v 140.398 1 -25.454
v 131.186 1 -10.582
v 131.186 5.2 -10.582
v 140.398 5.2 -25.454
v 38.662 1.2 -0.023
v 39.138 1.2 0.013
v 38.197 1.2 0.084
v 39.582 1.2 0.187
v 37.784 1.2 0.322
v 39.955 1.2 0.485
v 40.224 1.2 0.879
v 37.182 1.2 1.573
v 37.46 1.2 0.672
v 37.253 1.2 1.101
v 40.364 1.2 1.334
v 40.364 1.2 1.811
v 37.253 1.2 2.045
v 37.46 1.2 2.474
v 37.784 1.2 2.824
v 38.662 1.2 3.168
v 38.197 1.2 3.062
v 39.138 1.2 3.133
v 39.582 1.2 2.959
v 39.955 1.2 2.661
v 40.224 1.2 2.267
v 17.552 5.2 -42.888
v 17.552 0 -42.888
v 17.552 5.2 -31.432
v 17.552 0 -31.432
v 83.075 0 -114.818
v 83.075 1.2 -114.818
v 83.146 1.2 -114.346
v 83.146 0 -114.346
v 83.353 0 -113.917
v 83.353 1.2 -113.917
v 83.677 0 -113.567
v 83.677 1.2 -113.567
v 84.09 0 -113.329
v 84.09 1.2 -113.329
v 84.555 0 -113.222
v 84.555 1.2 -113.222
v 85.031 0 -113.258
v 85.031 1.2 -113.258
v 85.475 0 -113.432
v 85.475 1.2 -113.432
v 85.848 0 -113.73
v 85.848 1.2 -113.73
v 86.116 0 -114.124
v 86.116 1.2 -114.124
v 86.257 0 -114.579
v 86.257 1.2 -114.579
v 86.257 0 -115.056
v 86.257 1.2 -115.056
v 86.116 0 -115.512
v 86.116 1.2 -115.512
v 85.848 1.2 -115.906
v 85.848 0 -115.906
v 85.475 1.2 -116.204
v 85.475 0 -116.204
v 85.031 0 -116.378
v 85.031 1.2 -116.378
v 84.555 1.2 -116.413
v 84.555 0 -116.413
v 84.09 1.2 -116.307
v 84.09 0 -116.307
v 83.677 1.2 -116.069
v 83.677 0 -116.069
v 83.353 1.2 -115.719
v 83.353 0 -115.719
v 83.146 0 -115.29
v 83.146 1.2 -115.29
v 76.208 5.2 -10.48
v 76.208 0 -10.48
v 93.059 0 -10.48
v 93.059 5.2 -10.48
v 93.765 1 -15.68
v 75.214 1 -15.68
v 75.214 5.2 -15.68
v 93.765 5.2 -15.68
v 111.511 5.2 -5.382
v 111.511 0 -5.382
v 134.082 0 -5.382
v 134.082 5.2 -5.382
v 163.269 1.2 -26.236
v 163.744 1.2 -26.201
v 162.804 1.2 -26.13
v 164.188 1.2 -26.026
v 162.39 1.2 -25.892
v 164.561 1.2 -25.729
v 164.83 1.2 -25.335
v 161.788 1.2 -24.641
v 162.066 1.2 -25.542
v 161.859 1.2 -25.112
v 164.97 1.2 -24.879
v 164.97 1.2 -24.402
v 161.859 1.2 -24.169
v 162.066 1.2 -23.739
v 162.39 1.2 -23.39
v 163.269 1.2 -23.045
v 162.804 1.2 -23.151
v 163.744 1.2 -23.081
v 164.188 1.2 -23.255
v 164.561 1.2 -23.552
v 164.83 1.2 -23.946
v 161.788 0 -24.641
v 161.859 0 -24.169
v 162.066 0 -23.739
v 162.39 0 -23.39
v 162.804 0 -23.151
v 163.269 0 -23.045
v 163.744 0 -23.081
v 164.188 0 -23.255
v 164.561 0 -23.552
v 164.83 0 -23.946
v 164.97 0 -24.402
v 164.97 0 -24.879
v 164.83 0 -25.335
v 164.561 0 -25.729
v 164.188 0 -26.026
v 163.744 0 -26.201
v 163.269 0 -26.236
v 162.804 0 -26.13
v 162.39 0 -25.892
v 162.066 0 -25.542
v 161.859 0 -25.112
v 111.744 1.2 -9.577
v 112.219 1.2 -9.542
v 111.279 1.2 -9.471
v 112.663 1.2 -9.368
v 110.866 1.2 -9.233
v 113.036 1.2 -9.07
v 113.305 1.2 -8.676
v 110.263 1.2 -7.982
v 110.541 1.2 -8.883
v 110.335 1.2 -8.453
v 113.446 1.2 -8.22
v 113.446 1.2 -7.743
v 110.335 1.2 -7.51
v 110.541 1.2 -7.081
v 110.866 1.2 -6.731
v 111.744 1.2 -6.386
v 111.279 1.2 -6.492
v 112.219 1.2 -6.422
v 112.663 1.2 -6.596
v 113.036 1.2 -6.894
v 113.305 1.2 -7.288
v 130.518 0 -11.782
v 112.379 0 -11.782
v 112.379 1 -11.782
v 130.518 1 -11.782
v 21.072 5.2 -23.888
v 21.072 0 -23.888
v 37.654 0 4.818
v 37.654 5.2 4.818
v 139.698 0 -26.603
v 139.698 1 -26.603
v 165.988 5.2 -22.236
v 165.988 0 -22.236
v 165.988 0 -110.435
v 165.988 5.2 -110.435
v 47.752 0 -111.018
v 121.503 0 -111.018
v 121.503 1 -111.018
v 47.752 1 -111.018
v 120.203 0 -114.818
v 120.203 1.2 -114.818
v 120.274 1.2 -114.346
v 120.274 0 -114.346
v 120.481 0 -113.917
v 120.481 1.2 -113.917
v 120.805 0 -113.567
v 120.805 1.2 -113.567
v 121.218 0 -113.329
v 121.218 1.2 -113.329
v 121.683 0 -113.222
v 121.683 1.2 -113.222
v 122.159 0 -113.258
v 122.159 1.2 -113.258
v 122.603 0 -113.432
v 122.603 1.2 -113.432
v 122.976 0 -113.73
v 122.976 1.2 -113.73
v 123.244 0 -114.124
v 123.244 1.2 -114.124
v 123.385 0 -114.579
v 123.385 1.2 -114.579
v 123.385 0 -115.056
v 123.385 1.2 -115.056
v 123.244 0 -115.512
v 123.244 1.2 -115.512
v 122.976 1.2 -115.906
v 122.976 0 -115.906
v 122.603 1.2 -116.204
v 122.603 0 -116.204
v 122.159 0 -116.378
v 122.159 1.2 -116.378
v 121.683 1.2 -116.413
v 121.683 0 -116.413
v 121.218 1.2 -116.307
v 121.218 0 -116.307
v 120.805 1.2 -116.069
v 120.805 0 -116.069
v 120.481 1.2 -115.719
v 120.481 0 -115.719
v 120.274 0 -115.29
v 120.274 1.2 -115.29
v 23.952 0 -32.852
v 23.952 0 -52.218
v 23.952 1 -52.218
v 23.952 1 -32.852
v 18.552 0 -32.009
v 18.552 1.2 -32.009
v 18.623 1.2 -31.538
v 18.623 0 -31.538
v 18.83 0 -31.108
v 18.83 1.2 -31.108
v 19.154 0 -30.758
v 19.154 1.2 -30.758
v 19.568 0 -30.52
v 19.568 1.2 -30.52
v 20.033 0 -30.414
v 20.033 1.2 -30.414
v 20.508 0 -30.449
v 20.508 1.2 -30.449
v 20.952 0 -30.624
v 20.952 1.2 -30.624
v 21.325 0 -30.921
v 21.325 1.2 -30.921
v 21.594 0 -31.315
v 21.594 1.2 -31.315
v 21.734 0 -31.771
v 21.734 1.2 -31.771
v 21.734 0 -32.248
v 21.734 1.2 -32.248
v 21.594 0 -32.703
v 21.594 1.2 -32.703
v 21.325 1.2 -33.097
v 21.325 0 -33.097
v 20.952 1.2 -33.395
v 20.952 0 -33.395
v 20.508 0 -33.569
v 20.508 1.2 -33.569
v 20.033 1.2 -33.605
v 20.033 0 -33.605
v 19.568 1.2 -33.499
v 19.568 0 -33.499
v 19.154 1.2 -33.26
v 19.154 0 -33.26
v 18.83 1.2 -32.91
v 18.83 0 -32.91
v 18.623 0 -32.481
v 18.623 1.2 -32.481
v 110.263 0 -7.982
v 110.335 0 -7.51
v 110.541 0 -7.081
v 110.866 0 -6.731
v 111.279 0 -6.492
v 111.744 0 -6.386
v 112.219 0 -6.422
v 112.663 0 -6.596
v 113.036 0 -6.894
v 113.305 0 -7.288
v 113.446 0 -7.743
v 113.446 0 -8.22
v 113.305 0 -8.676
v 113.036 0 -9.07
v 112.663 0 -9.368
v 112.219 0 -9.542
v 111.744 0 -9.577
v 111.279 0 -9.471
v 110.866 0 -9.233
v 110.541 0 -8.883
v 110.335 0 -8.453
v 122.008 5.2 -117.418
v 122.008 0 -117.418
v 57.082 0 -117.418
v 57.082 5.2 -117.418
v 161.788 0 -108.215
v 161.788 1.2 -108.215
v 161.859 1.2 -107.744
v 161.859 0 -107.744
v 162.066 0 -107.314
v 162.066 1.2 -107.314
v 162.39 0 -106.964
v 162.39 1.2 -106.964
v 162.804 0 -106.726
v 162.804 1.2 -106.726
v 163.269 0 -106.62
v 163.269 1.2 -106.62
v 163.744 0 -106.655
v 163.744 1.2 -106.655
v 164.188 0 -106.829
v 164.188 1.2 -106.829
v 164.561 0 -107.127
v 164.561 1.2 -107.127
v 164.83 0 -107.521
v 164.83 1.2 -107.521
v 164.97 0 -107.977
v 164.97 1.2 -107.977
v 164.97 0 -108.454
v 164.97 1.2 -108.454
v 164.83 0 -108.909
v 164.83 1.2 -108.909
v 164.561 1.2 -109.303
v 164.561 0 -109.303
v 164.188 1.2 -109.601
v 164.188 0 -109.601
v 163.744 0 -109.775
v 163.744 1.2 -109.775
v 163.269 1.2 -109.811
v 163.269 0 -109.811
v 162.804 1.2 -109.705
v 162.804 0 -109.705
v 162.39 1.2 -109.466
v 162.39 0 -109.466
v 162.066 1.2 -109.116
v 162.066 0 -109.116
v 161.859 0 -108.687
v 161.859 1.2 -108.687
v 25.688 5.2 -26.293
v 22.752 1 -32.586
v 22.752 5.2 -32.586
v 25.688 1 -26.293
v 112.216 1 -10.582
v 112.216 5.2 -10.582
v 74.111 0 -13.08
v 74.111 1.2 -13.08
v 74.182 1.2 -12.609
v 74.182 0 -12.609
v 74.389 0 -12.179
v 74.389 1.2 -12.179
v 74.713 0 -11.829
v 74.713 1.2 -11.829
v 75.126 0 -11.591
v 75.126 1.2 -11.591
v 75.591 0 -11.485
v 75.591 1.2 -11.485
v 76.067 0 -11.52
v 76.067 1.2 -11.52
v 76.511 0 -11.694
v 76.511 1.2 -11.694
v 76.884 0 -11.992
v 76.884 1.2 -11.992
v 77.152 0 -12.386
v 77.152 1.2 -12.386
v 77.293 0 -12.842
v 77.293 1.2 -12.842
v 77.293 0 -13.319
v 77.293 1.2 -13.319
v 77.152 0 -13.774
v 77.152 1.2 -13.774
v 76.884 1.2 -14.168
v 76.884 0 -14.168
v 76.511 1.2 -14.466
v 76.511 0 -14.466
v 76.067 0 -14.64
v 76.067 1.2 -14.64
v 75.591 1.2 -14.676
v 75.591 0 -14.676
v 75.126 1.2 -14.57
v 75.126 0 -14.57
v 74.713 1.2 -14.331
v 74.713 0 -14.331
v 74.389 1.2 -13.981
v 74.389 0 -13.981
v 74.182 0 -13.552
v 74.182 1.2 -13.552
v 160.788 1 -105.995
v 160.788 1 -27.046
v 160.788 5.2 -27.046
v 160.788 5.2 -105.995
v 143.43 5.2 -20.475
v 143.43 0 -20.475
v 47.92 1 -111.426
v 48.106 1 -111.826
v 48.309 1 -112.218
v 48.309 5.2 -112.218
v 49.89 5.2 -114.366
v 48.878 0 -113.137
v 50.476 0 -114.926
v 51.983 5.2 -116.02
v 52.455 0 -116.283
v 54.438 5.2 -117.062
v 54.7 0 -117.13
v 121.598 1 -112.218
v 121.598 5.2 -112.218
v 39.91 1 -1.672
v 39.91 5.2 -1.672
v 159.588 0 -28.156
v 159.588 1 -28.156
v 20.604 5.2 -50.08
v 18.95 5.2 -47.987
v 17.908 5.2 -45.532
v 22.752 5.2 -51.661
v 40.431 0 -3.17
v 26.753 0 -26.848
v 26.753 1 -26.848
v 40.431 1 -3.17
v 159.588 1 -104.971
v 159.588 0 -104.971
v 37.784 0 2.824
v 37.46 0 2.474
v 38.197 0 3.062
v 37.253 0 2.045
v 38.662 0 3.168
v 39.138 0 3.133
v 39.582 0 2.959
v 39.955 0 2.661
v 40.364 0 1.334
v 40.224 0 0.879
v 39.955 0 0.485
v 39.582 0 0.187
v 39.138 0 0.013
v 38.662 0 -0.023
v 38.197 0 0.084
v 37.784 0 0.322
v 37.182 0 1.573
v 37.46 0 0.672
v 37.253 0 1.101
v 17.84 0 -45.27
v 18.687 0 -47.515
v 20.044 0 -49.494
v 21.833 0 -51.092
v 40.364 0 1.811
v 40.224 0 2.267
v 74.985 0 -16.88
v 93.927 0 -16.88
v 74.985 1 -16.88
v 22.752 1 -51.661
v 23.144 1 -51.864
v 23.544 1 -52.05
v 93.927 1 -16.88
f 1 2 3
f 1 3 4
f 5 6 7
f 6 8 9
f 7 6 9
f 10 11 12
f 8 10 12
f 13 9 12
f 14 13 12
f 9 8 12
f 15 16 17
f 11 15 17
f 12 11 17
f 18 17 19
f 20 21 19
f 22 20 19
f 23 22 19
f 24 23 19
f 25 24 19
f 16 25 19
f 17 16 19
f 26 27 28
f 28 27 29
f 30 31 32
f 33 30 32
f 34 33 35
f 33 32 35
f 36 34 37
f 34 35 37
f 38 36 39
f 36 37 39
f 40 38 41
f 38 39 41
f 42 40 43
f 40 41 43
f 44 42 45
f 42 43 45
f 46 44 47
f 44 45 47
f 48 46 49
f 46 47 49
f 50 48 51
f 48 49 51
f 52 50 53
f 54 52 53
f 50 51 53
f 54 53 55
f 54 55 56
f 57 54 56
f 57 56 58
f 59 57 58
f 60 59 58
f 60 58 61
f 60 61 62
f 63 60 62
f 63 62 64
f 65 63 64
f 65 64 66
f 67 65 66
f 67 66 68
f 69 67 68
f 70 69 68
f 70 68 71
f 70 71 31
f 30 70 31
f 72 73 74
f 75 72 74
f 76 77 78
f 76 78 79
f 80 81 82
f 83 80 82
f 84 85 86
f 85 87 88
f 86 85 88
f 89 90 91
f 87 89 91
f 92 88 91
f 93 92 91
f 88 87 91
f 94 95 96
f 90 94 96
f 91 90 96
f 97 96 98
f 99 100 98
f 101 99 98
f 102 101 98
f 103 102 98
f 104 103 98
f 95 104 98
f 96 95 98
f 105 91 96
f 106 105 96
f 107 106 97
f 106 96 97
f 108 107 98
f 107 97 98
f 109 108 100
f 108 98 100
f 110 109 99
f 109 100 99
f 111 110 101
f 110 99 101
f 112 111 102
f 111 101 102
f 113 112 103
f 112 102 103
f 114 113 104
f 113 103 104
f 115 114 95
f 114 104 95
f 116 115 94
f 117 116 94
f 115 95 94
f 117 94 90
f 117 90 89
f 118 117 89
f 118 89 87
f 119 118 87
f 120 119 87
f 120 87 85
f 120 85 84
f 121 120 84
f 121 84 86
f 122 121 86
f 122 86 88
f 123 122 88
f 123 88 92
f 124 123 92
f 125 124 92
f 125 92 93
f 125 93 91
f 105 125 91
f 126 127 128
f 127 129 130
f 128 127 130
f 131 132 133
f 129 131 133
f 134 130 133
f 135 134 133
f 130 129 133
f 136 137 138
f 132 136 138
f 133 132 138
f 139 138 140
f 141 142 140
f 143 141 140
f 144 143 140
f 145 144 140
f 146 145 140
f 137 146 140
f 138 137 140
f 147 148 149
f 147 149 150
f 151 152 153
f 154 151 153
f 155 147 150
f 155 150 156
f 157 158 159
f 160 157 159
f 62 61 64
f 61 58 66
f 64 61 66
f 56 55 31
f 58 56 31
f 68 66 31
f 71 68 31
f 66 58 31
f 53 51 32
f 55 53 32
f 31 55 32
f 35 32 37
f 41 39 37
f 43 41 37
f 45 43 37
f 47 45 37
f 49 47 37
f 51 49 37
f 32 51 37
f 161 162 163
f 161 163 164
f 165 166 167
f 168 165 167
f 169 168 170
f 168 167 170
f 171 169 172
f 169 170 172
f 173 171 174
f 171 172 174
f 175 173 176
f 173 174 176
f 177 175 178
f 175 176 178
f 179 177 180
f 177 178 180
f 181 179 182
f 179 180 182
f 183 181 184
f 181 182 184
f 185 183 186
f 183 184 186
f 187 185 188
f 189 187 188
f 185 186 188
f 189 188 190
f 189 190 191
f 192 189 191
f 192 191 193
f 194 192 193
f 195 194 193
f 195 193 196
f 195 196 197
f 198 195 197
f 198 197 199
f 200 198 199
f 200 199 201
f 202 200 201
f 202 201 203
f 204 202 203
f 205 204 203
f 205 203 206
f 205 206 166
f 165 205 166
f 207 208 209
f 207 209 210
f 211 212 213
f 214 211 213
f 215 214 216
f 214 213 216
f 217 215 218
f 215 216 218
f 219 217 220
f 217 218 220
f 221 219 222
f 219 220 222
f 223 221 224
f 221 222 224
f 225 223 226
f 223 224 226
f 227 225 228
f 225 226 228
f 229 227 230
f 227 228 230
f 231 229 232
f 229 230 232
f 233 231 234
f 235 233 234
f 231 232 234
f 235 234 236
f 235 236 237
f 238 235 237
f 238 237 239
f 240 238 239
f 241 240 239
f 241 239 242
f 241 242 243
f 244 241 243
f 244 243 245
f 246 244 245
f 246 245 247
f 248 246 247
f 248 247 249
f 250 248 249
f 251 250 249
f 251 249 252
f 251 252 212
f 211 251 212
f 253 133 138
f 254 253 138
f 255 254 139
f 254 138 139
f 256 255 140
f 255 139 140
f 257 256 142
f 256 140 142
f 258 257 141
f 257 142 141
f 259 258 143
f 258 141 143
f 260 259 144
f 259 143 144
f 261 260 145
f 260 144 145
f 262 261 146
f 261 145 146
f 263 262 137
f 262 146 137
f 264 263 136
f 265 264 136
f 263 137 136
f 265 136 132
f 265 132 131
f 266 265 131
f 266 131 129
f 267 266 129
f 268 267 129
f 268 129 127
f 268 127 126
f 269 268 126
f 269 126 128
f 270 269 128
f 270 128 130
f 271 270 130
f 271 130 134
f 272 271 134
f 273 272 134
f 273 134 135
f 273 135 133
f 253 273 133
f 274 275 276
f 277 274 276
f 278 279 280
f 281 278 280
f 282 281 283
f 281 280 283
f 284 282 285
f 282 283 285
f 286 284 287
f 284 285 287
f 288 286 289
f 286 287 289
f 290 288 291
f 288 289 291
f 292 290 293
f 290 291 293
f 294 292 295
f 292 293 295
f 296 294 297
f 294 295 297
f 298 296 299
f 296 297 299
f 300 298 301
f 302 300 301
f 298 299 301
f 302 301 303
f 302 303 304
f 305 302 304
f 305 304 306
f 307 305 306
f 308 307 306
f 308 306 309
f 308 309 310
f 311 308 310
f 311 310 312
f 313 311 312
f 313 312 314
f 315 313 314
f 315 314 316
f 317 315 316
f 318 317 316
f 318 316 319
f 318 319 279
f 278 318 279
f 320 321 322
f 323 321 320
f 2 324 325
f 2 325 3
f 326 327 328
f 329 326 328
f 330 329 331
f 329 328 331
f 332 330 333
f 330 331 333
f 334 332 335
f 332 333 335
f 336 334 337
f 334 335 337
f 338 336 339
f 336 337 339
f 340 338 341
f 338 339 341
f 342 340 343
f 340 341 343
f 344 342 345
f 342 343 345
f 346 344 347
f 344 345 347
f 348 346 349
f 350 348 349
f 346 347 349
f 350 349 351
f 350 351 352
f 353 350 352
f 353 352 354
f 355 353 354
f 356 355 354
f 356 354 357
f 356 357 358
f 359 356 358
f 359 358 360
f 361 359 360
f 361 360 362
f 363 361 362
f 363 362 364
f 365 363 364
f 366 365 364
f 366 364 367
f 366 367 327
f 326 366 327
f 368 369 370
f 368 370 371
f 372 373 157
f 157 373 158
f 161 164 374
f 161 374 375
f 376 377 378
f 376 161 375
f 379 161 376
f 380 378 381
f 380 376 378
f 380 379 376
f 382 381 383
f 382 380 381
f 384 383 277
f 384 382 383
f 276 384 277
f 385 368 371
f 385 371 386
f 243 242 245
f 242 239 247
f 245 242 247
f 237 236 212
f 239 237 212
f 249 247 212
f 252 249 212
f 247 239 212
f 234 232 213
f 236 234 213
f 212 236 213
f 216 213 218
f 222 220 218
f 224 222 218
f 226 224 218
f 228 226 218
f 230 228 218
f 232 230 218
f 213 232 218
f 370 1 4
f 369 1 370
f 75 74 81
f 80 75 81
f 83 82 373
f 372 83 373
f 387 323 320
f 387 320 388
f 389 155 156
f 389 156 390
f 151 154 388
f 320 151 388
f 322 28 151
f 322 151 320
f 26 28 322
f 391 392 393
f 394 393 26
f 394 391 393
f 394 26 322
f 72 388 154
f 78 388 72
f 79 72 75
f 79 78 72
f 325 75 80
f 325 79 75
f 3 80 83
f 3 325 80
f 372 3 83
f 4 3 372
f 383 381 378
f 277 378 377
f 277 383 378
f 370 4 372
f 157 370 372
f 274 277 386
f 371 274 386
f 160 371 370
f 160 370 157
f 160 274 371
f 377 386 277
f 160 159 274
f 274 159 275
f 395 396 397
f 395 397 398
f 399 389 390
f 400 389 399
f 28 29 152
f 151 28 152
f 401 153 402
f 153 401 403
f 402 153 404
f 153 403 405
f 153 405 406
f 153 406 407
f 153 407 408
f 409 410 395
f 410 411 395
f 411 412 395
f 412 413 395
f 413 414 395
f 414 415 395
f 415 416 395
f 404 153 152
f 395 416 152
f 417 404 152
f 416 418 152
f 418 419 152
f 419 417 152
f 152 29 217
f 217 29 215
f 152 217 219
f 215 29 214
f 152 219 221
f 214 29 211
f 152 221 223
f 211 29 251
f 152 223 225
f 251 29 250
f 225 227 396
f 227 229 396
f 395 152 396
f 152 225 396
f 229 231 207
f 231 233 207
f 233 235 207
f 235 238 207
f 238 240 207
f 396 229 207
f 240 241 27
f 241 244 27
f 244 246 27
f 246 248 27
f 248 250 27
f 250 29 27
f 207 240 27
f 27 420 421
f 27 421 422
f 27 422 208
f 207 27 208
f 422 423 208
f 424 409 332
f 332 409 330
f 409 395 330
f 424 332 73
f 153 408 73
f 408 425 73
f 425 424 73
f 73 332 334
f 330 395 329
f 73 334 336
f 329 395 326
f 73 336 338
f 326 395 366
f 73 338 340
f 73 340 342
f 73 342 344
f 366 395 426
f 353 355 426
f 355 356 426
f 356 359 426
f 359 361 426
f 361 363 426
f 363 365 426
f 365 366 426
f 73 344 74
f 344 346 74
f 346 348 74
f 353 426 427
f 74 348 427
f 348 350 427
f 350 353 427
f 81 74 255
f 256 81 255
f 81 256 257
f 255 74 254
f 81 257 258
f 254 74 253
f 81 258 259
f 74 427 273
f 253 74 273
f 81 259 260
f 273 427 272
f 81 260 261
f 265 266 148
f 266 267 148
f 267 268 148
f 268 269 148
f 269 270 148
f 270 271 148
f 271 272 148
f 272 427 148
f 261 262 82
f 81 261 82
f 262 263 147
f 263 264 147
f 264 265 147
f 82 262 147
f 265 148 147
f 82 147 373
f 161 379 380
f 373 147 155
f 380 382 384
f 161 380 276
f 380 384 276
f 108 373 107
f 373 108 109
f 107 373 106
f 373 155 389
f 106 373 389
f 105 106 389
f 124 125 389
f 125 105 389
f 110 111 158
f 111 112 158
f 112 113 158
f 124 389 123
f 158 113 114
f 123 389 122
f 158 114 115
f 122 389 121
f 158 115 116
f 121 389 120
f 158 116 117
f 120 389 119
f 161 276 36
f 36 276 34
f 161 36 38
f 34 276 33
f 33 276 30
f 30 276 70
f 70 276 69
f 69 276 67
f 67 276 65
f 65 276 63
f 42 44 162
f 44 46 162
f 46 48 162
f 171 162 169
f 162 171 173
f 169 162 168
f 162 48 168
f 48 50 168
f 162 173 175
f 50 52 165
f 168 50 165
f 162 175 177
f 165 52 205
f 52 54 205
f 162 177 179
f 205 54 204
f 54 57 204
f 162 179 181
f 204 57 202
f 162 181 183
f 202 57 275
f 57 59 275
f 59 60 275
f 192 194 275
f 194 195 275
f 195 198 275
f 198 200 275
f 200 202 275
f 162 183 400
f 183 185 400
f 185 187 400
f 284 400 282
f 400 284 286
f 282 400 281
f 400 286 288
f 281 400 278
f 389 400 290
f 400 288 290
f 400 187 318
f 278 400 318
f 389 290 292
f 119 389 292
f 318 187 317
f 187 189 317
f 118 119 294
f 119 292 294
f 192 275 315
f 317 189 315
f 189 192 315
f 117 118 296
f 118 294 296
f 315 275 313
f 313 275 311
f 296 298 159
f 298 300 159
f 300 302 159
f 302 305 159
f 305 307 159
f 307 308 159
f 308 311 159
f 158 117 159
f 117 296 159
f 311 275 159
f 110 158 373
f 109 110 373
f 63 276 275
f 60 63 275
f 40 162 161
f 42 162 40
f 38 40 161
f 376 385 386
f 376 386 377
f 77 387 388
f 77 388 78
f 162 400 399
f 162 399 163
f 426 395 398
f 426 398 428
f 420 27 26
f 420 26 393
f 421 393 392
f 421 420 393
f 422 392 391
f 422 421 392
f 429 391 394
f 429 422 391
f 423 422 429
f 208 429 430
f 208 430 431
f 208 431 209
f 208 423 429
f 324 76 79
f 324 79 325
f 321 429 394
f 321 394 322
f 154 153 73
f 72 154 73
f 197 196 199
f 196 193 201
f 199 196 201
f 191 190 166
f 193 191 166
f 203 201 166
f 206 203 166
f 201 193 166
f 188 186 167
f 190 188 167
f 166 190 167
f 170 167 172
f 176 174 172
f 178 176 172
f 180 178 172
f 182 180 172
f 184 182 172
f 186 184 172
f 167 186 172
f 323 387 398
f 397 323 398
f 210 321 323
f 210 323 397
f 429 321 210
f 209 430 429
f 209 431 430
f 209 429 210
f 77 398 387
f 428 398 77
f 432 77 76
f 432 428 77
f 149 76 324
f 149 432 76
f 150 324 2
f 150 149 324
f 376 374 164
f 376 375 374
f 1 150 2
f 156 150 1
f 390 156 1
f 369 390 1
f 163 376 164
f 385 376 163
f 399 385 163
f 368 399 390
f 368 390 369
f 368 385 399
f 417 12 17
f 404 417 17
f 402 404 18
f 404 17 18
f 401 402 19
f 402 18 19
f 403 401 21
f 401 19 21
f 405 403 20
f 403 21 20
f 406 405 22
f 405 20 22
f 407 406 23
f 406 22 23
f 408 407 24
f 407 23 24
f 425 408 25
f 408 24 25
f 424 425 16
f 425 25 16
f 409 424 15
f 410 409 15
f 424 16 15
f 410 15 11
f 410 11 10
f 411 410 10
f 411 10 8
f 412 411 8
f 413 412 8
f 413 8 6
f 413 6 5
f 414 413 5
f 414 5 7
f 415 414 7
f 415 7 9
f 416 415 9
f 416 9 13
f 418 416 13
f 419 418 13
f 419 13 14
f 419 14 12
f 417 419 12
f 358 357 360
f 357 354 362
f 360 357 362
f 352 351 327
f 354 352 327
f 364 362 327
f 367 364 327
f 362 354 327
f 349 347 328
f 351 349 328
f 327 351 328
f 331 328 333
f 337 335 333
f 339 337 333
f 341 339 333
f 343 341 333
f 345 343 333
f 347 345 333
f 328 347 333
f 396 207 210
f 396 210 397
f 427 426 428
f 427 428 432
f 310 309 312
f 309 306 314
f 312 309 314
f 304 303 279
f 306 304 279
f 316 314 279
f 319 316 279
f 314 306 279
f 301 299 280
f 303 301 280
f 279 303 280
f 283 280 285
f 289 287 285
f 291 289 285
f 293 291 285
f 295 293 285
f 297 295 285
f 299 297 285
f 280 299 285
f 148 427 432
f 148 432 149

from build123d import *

# Parameters (mm, degrees)
BOSS_EXTRUDE1_DEPTH       = 1
BOSS_EXTRUDE2_DEPTH       = 5.2
CUTOUT_W                  = 25
CUTOUT_H                  = 60
CUT_EXTRUDE1_DEPTH        = 204.386455918
F_3_0MM_DOWEL_HOLE2_D     = 3.2
F_3_0MM_DOWEL_HOLE2_DEPTH = 1.2
FILLET1_START             = -1
FILLET1_DEPTH             = 7
FILLET2_START             = -1
FILLET2_DEPTH             = 7


with BuildPart() as part:
    # outline → Boss-Extrude1 (new body)
    with BuildSketch(Plane(origin=(0, 0, 0), x_dir=(1, 0, 0), z_dir=(0, 1, 0))):
        Polygon((160.788080985, 105.9953847), (121.597788595, 112.217917805), (22.752080985, 112.217917805), (22.752080985, 32.585832501), (25.688129691, 26.292829341), (39.910245267, 1.671913524), (75.213887712, 15.680109343), (93.764616437, 15.680109343), (112.21601573, 10.581860359), (131.186066133, 10.581860359), (140.397681326, 25.454275085), (160.788080985, 27.045655036), align=None)
        Polygon((121.503115121, 111.017917805), (23.952080985, 111.017917805), (23.952080985, 32.851995342), (26.753439113, 26.847682296), (40.43096447, 3.169545341), (74.984511229, 16.880109343), (93.927351675, 16.880109343), (112.378750968, 11.781860359), (130.517785359, 11.781860359), (139.697830253, 26.603303939), (159.588080985, 28.155649493), (159.588080985, 104.970885583), align=None, mode=Mode.SUBTRACT)
    extrude(amount=BOSS_EXTRUDE1_DEPTH)

    # outline<9> → Boss-Extrude2 (add)
    with BuildSketch(Plane(origin=(0, 0, 0), x_dir=(1, 0, 0), z_dir=(0, 1, 0))):
        Polygon((165.988080985, 110.434880876), (122.008040315, 117.417917805), (17.552080985, 117.417917805), (17.552080985, 31.432460189), (21.071788866, 23.888466533), (37.653795388, -4.817824349), (76.207852469, 10.480109343), (93.059430407, 10.480109343), (111.510829699, 5.381860359), (134.081949487, 5.381860359), (143.430369308, 20.475150048), (165.988080985, 22.235679058), align=None)
        Polygon((121.597788595, 112.217917805), (22.752080985, 112.217917805), (22.752080985, 32.585832501), (25.688129691, 26.292829341), (39.910245267, 1.671913524), (75.213887712, 15.680109343), (93.764616437, 15.680109343), (112.21601573, 10.581860359), (131.186066133, 10.581860359), (140.397681326, 25.454275085), (160.788080985, 27.045655036), (160.788080985, 105.9953847), align=None, mode=Mode.SUBTRACT)
    extrude(amount=BOSS_EXTRUDE2_DEPTH)

    # cutout → Cut-Extrude1 (cut, through all)
    with BuildSketch(Plane(origin=(0, 0, 0), x_dir=(1, 0, 0), z_dir=(0, 1, 0))):
        with Locations((35.252080985, 82.217917805)):
            Rectangle(CUTOUT_W, CUTOUT_H)
        Polygon((17.552080985, 117.417917805), (17.552080985, 52.217917805), (22.752080985, 52.217917805), (22.752080985, 112.217917805), (47.752080985, 112.217917805), (47.752080985, 117.417917805), align=None)
    extrude(amount=CUT_EXTRUDE1_DEPTH, mode=Mode.SUBTRACT)

    # Ø3.0mm Dowel Hole2
    with Locations(Plane.XZ):
        with Locations((84.67493479, -114.817917805), (20.152080985, -32.009146345), (38.782020327, 1.572955412), (75.710870091, -13.080109343), (111.863422715, -7.981860359), (163.388080985, -24.640667047), (163.388080985, -108.215132788), (121.802914455, -114.817917805)):
            Hole(F_3_0MM_DOWEL_HOLE2_D / 2, depth=F_3_0MM_DOWEL_HOLE2_DEPTH)

    # Fillet1: read off the stored shape, not the designer's step
    # Fillet1 outline → Fillet1 (cut)
    with BuildSketch(Plane(origin=(0, 0, 0), x_dir=(1, 0, 0), z_dir=(0, 1, 0)).offset(FILLET1_START)):
        with BuildLine():
            Line((47.752080985, 117.417917805), (47.752080985, 111.017917805))
            ThreePointArc((47.752080985, 111.017917805), (51.424749768, 115.664129056), (57.081604017, 117.417917805))
            Line((57.081604017, 117.417917805), (47.752080985, 117.417917805))
        make_face()
    extrude(amount=FILLET1_DEPTH, mode=Mode.SUBTRACT)

    # Fillet2: read off the stored shape, not the designer's step
    # Fillet2 outline → Fillet2 (cut)
    with BuildSketch(Plane(origin=(0, 0, 0), x_dir=(1, 0, 0), z_dir=(0, 1, 0)).offset(FILLET2_START)):
        with BuildLine():
            Line((17.552080985, 52.217917805), (17.552080985, 42.888394773))
            ThreePointArc((17.552080985, 42.888394773), (19.305869734, 48.545249023), (23.952080985, 52.217917805))
            Line((23.952080985, 52.217917805), (17.552080985, 52.217917805))
        make_face()
    extrude(amount=FILLET2_DEPTH, mode=Mode.SUBTRACT)


solid = part.part
